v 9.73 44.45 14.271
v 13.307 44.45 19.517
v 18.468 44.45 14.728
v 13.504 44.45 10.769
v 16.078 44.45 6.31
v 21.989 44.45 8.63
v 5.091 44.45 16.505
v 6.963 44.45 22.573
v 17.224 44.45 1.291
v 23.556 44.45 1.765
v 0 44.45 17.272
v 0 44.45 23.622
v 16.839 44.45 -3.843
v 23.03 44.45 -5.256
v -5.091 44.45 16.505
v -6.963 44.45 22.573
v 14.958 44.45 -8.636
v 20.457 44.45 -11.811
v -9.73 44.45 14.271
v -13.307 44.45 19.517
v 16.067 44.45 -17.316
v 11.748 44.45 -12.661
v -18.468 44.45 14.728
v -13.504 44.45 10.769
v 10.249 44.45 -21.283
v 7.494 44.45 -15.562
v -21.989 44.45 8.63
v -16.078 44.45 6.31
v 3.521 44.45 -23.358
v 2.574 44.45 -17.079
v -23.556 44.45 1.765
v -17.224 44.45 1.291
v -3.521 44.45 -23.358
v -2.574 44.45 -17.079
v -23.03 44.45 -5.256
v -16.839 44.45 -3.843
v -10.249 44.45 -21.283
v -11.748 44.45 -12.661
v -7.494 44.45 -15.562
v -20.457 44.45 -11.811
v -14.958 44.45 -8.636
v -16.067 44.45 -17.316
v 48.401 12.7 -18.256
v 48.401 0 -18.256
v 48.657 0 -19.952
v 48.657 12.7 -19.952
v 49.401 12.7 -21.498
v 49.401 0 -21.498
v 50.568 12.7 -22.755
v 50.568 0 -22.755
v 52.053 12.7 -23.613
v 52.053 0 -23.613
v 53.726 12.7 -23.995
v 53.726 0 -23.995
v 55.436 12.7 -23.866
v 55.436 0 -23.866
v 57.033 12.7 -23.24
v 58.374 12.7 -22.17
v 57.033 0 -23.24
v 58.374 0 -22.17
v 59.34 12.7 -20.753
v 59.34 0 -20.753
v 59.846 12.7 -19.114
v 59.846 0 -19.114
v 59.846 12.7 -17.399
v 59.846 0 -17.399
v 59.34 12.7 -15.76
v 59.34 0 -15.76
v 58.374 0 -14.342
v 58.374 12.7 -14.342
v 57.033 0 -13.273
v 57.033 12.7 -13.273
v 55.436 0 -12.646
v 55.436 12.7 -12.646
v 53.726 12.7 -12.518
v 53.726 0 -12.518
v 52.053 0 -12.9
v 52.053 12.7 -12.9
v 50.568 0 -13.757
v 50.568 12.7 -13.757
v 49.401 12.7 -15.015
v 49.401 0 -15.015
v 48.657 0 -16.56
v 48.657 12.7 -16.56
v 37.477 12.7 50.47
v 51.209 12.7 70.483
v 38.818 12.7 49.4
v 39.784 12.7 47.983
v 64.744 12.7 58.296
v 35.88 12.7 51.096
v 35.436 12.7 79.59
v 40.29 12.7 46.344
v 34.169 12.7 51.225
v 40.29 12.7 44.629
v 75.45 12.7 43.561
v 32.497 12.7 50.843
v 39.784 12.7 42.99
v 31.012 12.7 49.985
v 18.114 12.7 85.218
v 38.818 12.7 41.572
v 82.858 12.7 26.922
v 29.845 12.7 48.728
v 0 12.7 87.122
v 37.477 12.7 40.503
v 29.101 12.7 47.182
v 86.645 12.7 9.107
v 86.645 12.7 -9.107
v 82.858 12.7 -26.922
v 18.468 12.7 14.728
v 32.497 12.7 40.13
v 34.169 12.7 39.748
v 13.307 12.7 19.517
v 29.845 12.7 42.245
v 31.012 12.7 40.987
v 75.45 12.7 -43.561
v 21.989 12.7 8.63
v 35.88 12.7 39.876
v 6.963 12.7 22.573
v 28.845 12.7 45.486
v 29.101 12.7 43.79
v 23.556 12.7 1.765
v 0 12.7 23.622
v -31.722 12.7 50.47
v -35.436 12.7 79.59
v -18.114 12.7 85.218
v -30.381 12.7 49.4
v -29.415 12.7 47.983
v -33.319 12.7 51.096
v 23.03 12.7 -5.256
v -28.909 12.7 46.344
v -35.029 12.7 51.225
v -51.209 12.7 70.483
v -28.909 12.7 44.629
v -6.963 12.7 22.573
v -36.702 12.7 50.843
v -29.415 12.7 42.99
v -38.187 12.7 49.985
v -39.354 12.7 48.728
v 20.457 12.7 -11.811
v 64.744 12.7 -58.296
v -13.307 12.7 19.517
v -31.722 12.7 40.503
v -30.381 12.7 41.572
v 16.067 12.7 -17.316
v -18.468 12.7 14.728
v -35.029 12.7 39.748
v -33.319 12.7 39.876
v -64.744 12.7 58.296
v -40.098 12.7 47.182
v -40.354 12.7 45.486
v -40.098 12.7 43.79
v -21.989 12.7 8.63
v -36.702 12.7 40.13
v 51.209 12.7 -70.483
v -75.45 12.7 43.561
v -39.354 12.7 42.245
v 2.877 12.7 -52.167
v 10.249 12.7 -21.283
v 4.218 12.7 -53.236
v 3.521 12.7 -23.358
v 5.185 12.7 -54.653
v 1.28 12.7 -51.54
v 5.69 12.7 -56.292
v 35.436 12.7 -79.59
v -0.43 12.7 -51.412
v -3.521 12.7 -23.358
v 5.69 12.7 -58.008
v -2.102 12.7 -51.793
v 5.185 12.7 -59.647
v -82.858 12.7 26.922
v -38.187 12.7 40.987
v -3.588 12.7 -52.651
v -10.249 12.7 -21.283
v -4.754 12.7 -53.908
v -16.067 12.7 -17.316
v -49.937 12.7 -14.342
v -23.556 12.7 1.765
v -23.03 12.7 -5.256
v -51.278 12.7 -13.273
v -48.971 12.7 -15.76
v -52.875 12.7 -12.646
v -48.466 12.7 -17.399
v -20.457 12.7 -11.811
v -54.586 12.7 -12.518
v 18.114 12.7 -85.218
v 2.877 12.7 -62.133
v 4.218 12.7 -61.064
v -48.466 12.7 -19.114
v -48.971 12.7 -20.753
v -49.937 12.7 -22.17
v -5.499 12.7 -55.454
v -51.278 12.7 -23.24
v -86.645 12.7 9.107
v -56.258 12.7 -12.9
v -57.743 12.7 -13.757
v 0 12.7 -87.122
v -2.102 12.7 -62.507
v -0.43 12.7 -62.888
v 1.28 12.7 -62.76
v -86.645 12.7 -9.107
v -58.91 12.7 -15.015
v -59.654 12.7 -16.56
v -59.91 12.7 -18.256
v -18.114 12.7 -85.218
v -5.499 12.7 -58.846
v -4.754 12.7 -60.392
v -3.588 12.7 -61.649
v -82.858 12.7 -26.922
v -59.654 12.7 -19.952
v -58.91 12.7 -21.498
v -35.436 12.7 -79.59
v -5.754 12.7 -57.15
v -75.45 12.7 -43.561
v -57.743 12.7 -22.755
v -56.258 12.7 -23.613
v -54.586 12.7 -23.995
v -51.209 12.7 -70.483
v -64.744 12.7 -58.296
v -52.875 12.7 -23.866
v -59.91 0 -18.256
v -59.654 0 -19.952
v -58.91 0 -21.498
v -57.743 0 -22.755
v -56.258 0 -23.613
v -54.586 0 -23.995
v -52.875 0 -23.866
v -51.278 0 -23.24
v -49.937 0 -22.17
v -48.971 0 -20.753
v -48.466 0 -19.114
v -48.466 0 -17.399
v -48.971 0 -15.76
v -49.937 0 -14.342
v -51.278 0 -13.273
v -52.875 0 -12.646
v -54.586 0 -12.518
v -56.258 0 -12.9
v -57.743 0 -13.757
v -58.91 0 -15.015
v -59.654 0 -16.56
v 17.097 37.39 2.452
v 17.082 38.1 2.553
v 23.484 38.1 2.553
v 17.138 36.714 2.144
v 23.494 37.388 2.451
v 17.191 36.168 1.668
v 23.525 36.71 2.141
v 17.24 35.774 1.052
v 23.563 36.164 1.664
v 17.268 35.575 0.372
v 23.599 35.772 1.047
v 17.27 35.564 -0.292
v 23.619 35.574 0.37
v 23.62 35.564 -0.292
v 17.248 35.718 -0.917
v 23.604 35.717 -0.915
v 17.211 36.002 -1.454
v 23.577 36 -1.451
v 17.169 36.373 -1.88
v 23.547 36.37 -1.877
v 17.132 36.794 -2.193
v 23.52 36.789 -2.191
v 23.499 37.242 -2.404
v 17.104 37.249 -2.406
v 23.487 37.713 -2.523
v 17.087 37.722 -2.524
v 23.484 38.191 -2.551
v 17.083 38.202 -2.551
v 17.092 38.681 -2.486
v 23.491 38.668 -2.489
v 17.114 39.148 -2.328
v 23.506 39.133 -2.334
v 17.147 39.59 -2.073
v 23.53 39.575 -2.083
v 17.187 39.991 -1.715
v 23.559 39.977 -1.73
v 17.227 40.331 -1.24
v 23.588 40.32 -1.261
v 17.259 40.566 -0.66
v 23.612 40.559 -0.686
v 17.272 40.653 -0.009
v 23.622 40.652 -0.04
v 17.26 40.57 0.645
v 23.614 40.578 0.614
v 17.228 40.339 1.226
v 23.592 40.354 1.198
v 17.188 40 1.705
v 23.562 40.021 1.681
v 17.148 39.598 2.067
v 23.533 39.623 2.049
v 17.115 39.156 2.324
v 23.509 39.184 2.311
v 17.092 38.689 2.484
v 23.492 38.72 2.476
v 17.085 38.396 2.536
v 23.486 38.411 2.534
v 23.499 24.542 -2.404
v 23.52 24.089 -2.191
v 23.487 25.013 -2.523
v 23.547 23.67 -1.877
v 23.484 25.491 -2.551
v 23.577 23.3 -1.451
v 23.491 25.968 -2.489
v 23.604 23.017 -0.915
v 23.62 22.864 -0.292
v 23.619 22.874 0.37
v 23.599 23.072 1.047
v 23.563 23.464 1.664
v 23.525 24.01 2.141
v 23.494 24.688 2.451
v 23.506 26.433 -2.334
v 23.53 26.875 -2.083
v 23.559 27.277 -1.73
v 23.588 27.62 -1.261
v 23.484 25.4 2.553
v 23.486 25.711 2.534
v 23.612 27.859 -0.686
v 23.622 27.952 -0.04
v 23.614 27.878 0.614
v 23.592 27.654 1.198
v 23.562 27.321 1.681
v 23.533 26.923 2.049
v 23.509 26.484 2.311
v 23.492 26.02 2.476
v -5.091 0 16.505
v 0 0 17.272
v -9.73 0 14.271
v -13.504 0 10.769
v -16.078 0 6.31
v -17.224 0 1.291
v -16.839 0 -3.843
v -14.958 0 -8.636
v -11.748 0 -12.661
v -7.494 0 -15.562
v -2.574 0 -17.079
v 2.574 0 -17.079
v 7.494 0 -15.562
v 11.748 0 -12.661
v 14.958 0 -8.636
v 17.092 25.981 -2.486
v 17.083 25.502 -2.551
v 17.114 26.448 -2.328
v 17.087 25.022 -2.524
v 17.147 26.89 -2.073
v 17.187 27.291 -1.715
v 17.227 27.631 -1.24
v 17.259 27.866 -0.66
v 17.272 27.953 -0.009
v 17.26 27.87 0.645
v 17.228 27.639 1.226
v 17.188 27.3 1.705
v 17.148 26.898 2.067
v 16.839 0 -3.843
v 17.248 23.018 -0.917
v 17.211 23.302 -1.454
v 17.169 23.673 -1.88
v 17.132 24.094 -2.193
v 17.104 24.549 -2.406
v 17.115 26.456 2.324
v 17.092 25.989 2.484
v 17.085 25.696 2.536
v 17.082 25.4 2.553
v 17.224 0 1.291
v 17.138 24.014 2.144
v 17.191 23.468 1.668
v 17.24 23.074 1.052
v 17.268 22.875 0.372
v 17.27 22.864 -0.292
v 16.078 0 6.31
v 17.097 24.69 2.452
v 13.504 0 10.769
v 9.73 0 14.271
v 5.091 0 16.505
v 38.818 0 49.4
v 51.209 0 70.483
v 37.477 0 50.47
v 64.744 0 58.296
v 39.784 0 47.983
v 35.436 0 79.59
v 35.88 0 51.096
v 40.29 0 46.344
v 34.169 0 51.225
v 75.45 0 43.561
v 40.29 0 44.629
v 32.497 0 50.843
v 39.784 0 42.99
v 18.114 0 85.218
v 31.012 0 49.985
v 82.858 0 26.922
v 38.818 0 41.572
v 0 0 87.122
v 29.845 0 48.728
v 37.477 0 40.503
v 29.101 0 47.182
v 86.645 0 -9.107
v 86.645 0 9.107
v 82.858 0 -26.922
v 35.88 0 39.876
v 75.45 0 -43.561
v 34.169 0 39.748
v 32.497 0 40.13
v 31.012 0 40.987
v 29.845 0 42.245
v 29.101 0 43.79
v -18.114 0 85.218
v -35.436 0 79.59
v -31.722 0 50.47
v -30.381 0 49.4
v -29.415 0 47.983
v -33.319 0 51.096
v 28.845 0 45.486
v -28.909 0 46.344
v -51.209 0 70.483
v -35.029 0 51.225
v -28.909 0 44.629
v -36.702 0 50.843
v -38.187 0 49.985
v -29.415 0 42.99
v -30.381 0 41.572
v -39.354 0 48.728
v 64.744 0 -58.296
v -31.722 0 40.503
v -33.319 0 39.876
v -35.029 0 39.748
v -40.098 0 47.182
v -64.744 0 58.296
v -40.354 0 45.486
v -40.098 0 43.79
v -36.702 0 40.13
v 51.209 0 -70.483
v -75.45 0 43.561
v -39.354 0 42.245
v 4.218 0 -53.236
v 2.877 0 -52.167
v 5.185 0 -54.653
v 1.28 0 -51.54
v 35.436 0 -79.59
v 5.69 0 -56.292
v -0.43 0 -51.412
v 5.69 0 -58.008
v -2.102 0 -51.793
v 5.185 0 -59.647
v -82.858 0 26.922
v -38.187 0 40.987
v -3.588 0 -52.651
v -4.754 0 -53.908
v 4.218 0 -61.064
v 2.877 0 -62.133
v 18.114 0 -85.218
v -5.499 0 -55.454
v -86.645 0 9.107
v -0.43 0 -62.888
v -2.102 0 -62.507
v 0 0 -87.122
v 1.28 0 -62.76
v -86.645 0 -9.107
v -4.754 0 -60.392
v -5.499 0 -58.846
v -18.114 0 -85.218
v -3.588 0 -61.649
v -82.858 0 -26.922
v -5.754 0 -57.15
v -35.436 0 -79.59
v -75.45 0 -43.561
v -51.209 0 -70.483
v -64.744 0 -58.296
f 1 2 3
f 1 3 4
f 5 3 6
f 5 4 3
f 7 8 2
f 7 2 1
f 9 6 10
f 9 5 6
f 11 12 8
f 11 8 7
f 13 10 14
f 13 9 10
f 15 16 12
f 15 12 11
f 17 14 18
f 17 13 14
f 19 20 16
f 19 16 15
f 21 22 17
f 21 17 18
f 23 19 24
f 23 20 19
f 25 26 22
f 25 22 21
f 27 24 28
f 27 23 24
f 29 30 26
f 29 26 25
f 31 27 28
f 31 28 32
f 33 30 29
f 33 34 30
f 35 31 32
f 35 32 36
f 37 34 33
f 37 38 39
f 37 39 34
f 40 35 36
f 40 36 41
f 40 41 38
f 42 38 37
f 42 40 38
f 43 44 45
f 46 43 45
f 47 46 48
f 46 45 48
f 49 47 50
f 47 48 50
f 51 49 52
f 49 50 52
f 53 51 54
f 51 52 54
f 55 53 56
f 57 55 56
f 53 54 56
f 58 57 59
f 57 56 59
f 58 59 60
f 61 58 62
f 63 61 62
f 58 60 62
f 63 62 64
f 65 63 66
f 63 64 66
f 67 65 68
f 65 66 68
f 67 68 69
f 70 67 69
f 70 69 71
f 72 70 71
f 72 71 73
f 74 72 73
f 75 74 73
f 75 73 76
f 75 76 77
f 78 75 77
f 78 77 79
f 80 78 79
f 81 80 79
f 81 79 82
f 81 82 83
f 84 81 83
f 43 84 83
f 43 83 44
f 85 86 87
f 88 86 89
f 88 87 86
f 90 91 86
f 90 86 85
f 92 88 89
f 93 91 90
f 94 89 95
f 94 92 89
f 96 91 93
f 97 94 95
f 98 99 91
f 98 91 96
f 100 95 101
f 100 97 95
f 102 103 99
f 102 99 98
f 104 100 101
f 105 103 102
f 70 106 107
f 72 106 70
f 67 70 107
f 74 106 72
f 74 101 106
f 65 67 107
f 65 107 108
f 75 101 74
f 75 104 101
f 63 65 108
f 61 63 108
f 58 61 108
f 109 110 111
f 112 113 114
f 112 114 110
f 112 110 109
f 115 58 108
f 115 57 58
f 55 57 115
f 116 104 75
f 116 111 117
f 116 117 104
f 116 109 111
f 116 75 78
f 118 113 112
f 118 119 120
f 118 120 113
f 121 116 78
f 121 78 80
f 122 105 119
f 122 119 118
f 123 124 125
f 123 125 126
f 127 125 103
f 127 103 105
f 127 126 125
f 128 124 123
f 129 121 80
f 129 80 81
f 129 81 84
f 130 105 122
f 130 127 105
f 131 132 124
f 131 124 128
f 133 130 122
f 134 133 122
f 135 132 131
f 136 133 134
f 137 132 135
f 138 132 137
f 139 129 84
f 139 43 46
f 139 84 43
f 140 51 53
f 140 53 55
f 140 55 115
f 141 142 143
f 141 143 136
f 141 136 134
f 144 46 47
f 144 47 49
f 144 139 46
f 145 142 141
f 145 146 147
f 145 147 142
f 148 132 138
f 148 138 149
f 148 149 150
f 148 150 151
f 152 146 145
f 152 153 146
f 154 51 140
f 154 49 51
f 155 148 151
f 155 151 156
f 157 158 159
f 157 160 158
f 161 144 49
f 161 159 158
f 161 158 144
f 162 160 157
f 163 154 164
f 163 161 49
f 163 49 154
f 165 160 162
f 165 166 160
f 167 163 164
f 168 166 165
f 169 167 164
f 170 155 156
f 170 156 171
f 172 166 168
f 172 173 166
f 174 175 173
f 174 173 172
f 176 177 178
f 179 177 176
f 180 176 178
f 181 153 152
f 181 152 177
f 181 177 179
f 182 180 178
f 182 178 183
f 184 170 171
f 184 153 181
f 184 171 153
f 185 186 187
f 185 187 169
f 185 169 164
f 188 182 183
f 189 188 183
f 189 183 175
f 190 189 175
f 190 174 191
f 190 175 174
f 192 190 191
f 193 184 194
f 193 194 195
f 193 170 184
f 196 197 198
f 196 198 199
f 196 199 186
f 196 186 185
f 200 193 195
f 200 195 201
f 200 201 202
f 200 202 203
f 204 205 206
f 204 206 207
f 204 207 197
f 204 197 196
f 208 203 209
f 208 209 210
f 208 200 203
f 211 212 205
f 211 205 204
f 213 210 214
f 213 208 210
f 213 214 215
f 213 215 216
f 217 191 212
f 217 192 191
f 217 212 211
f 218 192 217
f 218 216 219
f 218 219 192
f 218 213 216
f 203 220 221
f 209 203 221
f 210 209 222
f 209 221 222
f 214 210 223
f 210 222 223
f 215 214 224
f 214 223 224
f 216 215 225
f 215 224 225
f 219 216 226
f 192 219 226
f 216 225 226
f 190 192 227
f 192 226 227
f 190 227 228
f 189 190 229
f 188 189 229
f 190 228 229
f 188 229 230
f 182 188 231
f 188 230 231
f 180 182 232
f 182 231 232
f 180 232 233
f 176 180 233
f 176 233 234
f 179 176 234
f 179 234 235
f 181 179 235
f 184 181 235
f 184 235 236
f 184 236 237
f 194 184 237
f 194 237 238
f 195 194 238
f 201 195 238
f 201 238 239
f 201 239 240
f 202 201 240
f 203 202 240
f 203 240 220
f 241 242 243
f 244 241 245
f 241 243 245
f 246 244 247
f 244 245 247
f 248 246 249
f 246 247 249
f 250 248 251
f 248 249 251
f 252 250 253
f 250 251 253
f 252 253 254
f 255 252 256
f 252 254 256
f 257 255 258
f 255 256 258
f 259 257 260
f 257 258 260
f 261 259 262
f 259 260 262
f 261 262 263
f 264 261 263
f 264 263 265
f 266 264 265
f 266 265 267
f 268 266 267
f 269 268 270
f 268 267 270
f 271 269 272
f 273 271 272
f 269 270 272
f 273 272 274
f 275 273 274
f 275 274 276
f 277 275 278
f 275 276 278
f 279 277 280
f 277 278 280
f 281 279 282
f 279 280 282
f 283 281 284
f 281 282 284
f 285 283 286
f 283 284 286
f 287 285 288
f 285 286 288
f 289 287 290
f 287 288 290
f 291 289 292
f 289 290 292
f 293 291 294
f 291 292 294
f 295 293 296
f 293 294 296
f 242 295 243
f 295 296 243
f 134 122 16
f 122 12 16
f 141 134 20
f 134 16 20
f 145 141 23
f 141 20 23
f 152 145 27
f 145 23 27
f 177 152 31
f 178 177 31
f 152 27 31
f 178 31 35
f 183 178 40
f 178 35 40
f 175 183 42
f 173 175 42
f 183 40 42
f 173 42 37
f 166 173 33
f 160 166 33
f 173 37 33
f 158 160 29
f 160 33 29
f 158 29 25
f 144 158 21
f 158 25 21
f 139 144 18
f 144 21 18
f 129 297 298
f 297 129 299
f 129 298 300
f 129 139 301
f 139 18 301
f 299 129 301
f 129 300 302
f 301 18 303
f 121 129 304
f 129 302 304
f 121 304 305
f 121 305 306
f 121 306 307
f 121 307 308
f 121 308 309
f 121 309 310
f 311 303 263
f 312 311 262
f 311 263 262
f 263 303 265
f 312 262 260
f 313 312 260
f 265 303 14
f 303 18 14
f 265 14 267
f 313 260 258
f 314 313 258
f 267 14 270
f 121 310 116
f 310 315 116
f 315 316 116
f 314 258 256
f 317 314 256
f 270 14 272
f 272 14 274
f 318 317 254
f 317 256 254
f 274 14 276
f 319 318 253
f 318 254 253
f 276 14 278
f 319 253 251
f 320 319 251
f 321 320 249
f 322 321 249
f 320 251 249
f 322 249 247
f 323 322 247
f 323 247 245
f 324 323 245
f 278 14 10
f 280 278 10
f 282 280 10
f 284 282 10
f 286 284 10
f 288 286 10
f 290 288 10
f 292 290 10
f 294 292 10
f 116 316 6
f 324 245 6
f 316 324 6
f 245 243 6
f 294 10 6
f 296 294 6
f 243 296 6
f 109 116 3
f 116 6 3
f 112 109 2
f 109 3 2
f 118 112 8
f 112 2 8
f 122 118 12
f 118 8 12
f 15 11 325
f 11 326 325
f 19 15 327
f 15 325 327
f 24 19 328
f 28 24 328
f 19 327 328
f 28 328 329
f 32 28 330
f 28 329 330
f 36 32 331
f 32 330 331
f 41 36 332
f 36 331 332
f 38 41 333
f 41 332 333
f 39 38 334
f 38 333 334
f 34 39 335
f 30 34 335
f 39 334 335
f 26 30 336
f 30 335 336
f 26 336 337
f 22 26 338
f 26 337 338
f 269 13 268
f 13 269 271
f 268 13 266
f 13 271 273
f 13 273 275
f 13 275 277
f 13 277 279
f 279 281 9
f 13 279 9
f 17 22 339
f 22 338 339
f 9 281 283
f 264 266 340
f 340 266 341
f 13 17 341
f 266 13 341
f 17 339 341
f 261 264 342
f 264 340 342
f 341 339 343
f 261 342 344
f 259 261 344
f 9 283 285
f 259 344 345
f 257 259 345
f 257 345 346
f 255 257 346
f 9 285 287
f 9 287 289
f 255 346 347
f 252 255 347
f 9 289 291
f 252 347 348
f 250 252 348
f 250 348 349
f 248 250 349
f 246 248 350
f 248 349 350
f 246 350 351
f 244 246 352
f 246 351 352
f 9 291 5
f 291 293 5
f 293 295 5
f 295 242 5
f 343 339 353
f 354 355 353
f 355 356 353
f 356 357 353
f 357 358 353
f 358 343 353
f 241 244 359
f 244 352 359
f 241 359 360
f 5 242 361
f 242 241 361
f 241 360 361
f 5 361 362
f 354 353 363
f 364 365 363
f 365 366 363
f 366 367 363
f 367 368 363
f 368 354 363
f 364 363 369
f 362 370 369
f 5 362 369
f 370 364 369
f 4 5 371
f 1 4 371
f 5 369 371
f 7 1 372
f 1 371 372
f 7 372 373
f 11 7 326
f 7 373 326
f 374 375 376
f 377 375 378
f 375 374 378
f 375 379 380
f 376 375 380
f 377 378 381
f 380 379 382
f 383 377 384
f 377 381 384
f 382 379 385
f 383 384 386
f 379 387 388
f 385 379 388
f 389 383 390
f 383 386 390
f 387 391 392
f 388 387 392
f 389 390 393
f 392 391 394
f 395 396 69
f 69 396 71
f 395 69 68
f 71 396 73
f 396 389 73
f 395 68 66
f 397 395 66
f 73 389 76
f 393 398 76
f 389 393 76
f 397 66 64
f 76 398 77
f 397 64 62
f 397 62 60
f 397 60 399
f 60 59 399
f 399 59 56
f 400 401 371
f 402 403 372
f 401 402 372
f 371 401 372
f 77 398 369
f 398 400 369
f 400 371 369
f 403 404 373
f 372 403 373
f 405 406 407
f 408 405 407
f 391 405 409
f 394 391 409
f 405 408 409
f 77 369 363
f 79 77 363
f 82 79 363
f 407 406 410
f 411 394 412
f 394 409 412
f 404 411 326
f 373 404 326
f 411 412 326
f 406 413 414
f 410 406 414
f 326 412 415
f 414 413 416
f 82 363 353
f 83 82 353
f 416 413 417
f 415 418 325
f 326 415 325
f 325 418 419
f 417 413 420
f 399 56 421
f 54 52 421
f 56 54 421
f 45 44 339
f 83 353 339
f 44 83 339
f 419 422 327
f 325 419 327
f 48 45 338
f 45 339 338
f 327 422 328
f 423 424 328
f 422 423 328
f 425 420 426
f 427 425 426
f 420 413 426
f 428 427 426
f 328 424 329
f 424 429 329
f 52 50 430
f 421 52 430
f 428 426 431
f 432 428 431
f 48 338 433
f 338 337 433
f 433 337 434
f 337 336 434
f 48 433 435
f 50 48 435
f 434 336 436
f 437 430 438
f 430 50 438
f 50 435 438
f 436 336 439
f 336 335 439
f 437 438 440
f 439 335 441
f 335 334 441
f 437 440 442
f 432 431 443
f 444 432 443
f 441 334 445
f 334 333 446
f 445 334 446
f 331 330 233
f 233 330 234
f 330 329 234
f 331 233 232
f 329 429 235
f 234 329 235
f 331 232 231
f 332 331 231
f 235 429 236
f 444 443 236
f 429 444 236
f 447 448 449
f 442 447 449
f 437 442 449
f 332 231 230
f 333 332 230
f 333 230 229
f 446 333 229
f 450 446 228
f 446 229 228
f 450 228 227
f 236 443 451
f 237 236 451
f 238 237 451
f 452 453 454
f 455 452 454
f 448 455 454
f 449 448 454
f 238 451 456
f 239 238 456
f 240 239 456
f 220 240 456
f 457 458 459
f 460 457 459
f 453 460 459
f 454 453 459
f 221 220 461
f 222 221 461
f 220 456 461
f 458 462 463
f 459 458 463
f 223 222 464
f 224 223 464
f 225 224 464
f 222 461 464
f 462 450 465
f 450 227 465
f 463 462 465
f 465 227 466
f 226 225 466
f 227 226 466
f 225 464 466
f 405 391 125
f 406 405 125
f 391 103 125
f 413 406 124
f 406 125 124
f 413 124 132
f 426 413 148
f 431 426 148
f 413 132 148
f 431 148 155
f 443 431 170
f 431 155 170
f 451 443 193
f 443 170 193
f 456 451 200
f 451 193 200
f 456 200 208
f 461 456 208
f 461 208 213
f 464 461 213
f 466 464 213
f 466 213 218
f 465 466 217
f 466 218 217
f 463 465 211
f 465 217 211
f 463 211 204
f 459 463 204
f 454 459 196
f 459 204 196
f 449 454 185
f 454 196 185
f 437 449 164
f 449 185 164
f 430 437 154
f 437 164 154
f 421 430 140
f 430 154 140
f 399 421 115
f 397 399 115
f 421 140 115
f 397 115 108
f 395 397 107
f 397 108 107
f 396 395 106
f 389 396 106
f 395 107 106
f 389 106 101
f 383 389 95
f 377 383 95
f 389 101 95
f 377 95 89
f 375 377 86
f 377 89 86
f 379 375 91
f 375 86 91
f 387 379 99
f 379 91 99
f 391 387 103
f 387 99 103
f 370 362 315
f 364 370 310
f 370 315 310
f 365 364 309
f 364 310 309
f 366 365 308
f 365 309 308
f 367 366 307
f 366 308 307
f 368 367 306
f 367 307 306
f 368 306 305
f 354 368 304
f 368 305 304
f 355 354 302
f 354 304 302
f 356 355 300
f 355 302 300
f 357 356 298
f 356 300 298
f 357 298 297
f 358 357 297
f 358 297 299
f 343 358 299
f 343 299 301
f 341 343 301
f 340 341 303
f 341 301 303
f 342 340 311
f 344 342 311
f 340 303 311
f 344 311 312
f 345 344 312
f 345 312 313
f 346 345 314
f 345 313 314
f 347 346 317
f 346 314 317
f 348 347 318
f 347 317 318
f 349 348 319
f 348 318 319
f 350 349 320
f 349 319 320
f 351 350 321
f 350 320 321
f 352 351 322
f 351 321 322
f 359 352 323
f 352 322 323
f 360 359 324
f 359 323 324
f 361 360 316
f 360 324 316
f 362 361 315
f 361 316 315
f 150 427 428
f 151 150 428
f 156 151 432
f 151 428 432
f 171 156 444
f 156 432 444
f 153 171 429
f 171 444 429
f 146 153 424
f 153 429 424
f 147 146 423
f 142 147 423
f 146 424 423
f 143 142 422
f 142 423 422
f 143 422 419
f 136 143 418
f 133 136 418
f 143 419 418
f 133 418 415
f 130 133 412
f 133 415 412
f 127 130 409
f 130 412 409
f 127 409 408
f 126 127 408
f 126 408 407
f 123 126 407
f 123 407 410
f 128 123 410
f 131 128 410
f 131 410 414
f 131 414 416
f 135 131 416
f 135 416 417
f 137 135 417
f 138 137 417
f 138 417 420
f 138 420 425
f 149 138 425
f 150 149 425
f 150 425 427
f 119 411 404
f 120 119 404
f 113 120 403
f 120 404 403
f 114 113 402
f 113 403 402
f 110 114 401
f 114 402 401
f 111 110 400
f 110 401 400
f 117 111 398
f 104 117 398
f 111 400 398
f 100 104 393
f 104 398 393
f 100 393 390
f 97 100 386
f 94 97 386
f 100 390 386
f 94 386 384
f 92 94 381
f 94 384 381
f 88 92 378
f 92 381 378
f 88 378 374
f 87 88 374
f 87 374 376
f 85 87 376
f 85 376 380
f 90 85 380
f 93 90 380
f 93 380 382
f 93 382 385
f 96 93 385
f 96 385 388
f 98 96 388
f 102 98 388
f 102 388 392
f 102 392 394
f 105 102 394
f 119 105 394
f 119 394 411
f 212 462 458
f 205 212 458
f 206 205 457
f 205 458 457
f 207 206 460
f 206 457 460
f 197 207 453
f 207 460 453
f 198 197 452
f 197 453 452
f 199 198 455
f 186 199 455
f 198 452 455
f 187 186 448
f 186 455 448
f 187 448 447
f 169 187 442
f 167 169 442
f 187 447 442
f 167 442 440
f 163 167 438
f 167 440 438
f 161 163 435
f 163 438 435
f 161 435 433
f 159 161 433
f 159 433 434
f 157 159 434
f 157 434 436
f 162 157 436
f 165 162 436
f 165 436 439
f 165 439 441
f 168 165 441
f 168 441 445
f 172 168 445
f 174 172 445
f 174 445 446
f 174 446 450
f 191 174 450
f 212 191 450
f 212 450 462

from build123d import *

# Parameters (mm, degrees)
SKETCH1_W                        = 6.35
SKETCH1_H                        = 31.75
SKETCH1_W_2                      = 69.85
SKETCH1_H_2                      = 12.7
F_1_2_20_TAPPED_HOLE1_D          = 11.50874
SKETCH7_W                        = 2.5527
SKETCH7_H                        = 87.122
F_1_4_20_TAPPED_HOLE1_AT_2_COUNT = 2
F_1_4_20_TAPPED_HOLE1_AT_2_PITCH = 12.7


with BuildPart() as part:
    # Sketch1 → Revolve1 (revolve)
    with BuildSketch(Plane.XY, mode=Mode.PRIVATE) as revolve1_sk:
        with Locations((20.447, 28.575)):
            Rectangle(SKETCH1_W, SKETCH1_H)
        with Locations((52.197, 6.35)):
            Rectangle(SKETCH1_W_2, SKETCH1_H_2)
    revolve(revolve1_sk.sketch.rotate(Axis((0, 7.809475806, 0), (0, -1, 0)), 90), axis=Axis((0, 7.809475806, 0), (0, -1, 0)))

    # 1/2-20 Tapped Hole1 (through all)
    with Locations(Plane(origin=(0, 12.7, 0), x_dir=(1, 0, 0), z_dir=(0, 1, 0))):
        with Locations((-54.155626078, 18.25625), (0, 57.15), (54.155626078, 18.25625), (34.599427772, -45.486284722), (-34.599427772, -45.486284722)):
            Hole(F_1_2_20_TAPPED_HOLE1_D / 2)

    # Sketch7 → 1/4-20 Tapped Hole1 (revolve, cut)
    with BuildSketch(Plane.ZX.offset(38.1)):
        with Locations((1.27635, 43.561)):
            Rectangle(SKETCH7_W, SKETCH7_H)
    f_1_4_20_tapped_hole1 = revolve(axis=Axis((-6.35, 38.1, 0), (1, 0, 0)), mode=Mode.SUBTRACT)

    # 1/4-20 Tapped Hole1 at 2: 1/4-20 Tapped Hole1 ×2
    with Locations(*[(0, -i * F_1_4_20_TAPPED_HOLE1_AT_2_PITCH, 0) for i in range(1, F_1_4_20_TAPPED_HOLE1_AT_2_COUNT)]):
        add(f_1_4_20_tapped_hole1, mode=Mode.SUBTRACT)


solid = part.part
